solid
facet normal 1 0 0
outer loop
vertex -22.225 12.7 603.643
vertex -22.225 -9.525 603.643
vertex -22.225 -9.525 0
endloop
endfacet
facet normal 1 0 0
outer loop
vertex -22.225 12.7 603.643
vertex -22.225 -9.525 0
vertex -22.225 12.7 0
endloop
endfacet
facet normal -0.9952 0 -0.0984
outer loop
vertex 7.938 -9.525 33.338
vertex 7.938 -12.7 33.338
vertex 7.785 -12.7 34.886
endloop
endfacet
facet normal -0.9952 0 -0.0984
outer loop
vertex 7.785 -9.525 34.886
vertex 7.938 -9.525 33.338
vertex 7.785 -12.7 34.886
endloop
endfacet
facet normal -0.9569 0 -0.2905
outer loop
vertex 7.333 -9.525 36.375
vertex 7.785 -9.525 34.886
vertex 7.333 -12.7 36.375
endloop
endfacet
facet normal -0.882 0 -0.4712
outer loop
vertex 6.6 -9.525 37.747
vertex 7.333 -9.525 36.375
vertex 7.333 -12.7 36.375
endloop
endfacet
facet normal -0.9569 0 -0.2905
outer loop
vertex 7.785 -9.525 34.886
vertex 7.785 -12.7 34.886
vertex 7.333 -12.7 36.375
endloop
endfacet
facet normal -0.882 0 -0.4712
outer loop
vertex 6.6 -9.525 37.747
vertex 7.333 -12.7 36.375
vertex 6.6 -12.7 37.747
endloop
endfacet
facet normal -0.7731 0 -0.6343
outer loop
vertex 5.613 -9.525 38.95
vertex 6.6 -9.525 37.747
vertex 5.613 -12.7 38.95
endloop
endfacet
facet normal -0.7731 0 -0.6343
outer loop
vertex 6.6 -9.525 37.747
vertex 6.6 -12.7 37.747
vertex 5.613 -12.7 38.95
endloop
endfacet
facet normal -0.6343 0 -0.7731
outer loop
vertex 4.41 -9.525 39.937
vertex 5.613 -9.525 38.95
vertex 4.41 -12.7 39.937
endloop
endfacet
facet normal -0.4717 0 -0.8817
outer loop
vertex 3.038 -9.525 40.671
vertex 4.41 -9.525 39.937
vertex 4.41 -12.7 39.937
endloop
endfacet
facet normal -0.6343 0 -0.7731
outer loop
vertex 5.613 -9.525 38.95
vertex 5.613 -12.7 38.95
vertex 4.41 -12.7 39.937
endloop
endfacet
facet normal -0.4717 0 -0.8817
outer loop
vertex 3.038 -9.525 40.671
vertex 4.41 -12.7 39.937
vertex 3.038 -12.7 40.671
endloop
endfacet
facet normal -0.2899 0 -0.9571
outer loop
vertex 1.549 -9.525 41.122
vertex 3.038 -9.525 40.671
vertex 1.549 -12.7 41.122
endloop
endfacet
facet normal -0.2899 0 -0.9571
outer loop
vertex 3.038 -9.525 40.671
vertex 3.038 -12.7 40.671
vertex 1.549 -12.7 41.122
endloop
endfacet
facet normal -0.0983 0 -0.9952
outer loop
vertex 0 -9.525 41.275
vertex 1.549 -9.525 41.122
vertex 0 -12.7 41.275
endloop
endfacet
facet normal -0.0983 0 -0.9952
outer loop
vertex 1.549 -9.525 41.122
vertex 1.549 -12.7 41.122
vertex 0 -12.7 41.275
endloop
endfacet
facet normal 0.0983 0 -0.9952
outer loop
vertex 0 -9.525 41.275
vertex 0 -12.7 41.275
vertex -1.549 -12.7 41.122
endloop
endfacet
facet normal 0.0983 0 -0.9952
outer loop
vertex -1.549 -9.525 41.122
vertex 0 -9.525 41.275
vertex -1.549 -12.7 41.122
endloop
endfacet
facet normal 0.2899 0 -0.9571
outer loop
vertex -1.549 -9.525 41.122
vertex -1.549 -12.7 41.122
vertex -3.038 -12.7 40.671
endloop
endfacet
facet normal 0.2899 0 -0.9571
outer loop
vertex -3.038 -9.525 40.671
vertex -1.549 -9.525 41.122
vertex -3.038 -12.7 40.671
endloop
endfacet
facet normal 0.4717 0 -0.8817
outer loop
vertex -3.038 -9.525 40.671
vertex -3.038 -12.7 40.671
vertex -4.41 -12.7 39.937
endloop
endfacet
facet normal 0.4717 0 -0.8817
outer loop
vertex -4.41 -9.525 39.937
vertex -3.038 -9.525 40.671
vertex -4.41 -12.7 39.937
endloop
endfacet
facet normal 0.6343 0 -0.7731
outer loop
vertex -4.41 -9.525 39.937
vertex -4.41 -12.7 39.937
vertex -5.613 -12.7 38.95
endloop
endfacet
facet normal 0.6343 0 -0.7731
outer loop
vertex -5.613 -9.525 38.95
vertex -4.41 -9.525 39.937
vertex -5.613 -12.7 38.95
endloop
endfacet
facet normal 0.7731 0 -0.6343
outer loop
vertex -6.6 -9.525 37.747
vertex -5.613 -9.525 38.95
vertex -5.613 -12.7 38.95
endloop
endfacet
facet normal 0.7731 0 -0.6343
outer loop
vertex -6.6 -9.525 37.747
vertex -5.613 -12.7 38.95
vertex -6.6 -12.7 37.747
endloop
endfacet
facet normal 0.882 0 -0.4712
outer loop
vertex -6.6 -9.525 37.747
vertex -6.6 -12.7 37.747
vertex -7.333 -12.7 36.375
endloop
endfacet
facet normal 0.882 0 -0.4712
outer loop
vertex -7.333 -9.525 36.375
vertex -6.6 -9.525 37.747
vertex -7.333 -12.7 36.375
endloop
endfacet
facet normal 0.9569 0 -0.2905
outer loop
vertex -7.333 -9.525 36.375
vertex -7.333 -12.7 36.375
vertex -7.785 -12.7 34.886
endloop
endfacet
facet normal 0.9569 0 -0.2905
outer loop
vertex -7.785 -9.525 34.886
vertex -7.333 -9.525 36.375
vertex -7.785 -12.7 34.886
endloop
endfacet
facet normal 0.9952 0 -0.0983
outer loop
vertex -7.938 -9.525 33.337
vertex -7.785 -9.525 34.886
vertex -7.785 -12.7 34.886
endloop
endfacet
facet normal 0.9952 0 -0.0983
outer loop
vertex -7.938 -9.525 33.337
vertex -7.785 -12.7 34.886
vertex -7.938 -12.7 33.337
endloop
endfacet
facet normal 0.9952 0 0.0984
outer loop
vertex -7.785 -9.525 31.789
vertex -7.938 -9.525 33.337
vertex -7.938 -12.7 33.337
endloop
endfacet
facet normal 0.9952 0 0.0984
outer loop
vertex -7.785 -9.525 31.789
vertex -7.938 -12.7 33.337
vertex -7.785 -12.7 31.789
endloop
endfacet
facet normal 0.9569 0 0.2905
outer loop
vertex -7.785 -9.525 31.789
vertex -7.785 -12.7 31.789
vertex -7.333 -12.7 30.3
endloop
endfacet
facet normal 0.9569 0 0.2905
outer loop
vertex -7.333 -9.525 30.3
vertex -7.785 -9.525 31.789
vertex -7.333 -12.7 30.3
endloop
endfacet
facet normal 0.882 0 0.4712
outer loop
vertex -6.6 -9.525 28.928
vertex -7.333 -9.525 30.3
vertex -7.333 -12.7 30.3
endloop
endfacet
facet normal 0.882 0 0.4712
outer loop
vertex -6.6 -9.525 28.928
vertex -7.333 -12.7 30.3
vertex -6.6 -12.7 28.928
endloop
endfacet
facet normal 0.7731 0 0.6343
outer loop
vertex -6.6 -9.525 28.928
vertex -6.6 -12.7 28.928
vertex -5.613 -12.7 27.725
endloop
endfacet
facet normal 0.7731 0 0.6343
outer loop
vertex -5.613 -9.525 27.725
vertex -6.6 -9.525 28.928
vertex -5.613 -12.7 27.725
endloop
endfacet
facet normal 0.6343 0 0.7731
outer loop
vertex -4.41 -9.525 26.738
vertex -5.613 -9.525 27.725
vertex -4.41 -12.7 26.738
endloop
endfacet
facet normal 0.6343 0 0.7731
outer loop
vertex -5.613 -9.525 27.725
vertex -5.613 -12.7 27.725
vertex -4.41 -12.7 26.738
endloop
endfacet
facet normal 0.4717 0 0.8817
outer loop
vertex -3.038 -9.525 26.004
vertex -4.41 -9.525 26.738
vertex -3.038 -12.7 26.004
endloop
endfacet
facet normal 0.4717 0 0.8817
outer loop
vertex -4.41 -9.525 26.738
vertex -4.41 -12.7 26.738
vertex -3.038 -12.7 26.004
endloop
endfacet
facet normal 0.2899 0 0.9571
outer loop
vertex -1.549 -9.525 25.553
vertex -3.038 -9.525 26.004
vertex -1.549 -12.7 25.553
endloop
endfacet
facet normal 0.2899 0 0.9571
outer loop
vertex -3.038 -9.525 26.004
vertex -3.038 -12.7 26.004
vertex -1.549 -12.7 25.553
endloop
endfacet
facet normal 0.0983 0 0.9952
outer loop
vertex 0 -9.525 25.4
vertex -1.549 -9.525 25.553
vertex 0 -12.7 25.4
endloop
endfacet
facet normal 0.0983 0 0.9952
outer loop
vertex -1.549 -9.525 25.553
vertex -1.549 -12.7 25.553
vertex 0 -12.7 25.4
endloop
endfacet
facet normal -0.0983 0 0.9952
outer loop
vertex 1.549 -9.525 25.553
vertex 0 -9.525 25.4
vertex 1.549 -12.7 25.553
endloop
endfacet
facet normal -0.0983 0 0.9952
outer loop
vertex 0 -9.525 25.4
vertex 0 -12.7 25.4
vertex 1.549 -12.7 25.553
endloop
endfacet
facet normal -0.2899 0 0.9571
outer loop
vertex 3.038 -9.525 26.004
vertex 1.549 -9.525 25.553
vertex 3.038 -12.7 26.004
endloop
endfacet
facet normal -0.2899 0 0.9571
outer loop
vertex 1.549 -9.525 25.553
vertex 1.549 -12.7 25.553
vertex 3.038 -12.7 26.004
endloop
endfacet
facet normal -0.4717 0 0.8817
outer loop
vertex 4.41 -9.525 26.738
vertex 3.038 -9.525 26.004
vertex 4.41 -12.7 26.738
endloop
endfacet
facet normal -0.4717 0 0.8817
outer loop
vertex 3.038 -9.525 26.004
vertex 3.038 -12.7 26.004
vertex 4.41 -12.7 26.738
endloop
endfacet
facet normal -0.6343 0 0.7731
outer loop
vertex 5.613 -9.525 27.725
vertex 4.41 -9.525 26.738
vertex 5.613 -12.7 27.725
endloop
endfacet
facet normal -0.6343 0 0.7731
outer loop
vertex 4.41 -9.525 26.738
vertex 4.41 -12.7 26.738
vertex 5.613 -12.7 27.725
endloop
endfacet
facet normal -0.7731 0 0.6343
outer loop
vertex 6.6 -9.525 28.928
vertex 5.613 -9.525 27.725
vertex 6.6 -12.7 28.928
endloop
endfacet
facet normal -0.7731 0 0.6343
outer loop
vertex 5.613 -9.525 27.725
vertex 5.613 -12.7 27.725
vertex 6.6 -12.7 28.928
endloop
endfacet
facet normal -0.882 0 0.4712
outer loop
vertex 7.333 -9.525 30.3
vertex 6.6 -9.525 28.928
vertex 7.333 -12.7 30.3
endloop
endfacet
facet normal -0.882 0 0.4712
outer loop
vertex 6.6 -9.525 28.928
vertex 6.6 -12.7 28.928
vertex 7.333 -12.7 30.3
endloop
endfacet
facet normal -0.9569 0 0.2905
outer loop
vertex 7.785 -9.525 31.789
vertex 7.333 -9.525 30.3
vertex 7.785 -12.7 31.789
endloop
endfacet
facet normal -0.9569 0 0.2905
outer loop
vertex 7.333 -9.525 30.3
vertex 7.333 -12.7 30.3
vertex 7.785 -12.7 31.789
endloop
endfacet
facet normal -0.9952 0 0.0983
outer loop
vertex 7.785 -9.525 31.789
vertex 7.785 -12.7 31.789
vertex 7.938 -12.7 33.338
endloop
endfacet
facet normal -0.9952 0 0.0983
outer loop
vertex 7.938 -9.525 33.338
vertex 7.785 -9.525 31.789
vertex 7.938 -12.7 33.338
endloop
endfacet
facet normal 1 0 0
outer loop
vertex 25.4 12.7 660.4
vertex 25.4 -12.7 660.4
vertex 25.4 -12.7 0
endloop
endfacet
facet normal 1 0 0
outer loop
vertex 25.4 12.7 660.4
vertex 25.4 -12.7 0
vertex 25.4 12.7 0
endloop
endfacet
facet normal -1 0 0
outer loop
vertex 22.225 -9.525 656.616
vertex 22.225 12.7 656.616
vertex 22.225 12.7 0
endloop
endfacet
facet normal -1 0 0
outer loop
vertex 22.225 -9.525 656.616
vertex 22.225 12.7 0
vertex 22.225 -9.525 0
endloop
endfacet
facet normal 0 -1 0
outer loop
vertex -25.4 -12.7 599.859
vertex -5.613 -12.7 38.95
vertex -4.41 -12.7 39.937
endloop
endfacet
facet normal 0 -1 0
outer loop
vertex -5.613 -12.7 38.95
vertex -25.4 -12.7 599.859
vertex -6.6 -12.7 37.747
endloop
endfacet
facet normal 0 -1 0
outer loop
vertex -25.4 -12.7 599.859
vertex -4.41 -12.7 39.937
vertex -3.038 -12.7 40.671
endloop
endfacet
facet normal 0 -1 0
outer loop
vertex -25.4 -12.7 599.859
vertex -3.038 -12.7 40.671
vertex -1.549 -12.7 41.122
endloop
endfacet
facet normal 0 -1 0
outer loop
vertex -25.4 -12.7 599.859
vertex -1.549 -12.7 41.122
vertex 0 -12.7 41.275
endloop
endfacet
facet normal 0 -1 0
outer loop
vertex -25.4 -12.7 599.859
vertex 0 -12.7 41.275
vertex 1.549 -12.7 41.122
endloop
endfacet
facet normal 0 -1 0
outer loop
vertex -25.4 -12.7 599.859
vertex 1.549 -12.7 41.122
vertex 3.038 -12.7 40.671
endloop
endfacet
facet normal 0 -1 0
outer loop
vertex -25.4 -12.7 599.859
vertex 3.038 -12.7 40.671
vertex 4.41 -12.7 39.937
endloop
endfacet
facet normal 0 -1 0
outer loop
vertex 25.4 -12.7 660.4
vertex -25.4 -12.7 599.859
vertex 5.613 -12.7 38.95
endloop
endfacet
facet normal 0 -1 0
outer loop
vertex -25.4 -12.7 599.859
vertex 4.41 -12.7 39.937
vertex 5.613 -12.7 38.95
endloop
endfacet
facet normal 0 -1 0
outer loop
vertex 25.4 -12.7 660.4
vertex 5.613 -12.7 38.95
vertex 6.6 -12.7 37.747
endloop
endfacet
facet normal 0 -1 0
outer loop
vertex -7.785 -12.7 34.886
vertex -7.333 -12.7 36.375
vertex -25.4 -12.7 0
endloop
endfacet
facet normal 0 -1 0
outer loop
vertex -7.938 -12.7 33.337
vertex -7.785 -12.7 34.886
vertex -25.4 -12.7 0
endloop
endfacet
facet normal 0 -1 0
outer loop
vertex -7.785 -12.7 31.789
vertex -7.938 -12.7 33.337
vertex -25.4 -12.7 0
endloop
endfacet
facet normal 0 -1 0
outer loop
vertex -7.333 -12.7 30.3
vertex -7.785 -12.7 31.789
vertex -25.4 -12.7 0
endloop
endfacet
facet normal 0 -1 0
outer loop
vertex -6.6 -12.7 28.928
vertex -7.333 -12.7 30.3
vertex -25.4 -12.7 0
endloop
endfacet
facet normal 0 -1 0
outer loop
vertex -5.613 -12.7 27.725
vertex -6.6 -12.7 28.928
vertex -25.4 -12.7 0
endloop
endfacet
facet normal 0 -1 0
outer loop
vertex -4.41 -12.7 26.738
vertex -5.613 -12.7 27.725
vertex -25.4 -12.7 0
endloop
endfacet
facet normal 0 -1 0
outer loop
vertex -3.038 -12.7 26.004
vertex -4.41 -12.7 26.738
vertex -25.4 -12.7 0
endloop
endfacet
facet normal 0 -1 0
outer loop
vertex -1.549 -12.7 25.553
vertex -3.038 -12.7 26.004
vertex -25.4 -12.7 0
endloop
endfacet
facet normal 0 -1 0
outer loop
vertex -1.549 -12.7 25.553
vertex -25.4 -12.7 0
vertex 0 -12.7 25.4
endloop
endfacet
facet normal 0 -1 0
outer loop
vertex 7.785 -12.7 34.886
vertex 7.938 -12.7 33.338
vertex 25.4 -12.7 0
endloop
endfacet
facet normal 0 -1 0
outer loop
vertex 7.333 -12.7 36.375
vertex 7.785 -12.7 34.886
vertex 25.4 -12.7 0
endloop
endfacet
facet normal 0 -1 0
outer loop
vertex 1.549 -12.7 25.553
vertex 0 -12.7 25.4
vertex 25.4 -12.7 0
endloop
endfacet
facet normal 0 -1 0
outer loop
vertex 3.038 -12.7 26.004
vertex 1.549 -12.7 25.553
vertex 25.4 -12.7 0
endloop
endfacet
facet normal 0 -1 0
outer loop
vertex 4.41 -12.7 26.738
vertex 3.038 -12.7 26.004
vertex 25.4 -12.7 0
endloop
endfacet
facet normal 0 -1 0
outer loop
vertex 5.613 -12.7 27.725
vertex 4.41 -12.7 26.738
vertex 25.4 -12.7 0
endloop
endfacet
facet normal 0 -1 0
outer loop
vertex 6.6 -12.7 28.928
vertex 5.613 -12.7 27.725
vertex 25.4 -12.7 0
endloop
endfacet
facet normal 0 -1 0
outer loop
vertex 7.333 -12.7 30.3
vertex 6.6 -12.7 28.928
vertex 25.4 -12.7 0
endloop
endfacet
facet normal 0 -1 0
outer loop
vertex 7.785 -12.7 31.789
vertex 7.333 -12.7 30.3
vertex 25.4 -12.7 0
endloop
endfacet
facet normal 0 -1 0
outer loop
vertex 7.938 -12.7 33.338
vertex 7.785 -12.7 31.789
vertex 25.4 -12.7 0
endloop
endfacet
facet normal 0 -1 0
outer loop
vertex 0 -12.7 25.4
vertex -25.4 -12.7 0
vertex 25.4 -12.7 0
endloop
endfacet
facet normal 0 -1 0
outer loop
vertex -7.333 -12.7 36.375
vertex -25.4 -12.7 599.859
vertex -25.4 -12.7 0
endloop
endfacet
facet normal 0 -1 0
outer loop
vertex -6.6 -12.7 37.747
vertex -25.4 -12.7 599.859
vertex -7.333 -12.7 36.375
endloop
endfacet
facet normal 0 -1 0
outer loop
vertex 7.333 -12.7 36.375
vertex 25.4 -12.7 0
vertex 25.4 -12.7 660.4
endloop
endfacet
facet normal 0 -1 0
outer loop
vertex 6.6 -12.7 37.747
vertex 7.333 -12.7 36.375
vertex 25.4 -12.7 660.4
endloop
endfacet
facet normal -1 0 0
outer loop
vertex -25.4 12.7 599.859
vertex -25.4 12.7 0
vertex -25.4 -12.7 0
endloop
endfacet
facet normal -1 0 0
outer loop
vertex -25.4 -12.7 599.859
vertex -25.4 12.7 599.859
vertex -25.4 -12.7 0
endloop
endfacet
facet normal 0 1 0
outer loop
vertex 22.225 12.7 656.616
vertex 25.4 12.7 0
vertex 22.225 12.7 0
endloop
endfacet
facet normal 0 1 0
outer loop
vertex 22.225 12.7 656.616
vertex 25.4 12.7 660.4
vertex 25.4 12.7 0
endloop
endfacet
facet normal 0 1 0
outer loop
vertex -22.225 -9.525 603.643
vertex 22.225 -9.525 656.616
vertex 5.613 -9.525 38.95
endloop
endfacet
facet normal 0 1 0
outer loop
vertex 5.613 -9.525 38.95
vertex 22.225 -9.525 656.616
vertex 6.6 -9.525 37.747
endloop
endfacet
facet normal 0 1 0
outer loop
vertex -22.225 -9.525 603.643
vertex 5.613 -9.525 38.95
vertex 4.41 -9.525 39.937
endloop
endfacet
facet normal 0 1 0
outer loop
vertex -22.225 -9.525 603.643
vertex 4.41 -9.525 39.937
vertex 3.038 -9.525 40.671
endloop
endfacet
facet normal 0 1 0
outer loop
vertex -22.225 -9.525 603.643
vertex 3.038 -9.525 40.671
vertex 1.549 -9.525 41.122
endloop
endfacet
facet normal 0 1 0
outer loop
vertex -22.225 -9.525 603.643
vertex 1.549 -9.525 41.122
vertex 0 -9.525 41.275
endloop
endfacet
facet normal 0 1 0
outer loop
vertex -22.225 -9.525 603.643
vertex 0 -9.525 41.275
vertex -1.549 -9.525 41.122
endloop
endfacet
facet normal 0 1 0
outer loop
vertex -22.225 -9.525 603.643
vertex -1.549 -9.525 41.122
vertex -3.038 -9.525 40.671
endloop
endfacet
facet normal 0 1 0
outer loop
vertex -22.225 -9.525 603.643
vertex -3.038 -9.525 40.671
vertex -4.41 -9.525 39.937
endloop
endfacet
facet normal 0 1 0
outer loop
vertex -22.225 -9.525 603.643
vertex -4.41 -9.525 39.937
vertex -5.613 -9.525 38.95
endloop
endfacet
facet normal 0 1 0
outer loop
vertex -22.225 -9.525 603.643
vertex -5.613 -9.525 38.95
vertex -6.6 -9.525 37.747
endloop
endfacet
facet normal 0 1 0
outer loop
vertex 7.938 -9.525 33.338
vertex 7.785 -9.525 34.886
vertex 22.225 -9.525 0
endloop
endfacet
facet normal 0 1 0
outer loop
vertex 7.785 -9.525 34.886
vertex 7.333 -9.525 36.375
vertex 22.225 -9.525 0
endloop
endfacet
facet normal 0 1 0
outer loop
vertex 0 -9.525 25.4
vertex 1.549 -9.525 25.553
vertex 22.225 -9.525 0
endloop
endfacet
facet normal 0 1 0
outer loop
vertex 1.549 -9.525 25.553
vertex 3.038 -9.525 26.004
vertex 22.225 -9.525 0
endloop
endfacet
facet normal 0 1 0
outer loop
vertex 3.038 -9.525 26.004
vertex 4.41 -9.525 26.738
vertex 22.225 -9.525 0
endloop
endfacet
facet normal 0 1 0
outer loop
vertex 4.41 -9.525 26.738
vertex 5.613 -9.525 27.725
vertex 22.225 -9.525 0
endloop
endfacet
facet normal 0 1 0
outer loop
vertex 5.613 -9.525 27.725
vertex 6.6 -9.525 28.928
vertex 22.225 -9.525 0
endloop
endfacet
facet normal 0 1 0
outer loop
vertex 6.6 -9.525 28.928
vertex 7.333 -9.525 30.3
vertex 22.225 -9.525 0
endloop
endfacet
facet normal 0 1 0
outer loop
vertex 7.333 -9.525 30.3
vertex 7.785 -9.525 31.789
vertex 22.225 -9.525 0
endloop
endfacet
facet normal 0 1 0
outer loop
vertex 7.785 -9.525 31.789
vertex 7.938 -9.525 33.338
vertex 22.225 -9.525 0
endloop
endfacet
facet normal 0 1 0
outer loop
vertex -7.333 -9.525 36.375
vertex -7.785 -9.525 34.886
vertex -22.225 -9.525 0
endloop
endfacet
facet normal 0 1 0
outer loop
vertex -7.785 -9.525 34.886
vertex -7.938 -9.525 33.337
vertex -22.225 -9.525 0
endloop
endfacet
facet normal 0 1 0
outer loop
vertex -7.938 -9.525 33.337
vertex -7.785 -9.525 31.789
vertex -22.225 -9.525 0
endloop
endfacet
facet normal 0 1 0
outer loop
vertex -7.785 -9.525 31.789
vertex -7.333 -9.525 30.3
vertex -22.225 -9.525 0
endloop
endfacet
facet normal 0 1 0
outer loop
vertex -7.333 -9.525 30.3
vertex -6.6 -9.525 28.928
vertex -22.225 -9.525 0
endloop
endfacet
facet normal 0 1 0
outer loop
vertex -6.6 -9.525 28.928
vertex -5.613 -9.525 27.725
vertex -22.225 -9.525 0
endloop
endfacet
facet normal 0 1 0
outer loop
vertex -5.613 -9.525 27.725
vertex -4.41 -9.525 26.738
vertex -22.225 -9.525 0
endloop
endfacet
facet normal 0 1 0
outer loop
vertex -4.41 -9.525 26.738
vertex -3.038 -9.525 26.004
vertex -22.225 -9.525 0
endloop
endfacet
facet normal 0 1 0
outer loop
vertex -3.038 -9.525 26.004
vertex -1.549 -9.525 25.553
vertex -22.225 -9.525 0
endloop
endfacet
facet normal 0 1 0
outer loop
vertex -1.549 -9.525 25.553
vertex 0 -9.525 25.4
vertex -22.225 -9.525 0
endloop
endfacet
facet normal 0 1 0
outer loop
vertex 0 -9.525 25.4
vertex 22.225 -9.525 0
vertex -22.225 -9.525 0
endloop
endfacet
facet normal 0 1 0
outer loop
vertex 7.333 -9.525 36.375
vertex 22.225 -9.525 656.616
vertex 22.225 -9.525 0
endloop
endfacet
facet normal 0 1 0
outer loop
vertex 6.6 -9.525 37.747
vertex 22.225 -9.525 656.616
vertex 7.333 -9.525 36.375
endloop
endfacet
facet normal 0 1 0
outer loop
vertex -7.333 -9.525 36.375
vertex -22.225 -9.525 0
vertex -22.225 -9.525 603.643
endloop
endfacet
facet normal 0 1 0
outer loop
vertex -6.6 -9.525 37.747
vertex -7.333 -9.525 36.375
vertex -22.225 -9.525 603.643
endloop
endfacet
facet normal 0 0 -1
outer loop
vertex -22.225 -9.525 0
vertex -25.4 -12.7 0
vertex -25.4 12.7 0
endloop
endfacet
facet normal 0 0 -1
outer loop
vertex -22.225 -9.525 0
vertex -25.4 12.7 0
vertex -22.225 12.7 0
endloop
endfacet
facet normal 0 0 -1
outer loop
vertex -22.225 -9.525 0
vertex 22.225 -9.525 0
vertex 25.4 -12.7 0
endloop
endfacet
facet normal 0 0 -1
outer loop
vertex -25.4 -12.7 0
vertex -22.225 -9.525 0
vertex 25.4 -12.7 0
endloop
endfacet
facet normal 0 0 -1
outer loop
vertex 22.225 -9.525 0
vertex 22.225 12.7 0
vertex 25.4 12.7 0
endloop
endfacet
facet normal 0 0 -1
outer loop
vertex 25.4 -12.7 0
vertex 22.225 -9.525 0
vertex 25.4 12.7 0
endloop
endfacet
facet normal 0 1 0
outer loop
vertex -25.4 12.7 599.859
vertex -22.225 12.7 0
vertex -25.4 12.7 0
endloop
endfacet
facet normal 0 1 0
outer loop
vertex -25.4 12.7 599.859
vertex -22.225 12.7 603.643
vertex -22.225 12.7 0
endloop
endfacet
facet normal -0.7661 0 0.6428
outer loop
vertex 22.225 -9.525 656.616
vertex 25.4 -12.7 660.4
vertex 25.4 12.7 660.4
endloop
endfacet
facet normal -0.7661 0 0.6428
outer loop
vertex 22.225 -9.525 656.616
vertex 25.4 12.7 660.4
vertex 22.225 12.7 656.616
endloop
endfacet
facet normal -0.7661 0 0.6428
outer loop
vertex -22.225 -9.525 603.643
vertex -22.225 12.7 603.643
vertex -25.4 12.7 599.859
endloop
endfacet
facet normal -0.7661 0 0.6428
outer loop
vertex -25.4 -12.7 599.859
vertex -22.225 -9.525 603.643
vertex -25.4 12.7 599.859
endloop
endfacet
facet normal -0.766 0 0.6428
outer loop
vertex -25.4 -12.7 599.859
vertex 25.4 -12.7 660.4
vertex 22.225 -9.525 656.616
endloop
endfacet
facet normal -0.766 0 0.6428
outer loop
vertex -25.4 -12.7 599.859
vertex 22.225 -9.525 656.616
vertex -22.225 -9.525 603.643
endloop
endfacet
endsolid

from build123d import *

# Parameters (mm, degrees)
BOSS_EXTRUDE1_DEPTH = 660.4
CUT_EXTRUDE1_DEPTH  = 662.376201568
CUT_EXTRUDE2_REACH  = 663.376
SKETCH3_R           = 7.9375


with BuildPart() as part:
    # Sketch1 → Boss-Extrude1 (new body)
    with BuildSketch(Plane.XY):
        Polygon((-22.225, -9.525), (-22.225, 12.7), (-25.4, 12.7), (-25.4, -12.7), (25.4, -12.7), (25.4, 12.7), (22.225, 12.7), (22.225, -9.525), align=None)
    extrude(amount=BOSS_EXTRUDE1_DEPTH)

    # Sketch2 → Cut-Extrude1 (cut, through all)
    with BuildSketch(Plane.XZ.offset(12.7)):
        Polygon((25.4, 660.4), (-25.4, 599.858917496), (-25.4, 660.4), align=None)
    extrude(amount=-CUT_EXTRUDE1_DEPTH, mode=Mode.SUBTRACT)

    # Sketch3 → Cut-Extrude2 (cut, up to next)
    with BuildSketch(Plane.XZ.offset(12.7), mode=Mode.PRIVATE) as cut_extrude2_sk1:
        with Locations((0, 33.3375)):
            Circle(SKETCH3_R)
    cut_extrude2_tool1 = extrude(cut_extrude2_sk1.sketch, amount=-CUT_EXTRUDE2_REACH, mode=Mode.PRIVATE) & part.part
    add(cut_extrude2_tool1.solids().sort_by_distance((0, -12.7, 33.3375))[0], mode=Mode.SUBTRACT)


solid = part.part
